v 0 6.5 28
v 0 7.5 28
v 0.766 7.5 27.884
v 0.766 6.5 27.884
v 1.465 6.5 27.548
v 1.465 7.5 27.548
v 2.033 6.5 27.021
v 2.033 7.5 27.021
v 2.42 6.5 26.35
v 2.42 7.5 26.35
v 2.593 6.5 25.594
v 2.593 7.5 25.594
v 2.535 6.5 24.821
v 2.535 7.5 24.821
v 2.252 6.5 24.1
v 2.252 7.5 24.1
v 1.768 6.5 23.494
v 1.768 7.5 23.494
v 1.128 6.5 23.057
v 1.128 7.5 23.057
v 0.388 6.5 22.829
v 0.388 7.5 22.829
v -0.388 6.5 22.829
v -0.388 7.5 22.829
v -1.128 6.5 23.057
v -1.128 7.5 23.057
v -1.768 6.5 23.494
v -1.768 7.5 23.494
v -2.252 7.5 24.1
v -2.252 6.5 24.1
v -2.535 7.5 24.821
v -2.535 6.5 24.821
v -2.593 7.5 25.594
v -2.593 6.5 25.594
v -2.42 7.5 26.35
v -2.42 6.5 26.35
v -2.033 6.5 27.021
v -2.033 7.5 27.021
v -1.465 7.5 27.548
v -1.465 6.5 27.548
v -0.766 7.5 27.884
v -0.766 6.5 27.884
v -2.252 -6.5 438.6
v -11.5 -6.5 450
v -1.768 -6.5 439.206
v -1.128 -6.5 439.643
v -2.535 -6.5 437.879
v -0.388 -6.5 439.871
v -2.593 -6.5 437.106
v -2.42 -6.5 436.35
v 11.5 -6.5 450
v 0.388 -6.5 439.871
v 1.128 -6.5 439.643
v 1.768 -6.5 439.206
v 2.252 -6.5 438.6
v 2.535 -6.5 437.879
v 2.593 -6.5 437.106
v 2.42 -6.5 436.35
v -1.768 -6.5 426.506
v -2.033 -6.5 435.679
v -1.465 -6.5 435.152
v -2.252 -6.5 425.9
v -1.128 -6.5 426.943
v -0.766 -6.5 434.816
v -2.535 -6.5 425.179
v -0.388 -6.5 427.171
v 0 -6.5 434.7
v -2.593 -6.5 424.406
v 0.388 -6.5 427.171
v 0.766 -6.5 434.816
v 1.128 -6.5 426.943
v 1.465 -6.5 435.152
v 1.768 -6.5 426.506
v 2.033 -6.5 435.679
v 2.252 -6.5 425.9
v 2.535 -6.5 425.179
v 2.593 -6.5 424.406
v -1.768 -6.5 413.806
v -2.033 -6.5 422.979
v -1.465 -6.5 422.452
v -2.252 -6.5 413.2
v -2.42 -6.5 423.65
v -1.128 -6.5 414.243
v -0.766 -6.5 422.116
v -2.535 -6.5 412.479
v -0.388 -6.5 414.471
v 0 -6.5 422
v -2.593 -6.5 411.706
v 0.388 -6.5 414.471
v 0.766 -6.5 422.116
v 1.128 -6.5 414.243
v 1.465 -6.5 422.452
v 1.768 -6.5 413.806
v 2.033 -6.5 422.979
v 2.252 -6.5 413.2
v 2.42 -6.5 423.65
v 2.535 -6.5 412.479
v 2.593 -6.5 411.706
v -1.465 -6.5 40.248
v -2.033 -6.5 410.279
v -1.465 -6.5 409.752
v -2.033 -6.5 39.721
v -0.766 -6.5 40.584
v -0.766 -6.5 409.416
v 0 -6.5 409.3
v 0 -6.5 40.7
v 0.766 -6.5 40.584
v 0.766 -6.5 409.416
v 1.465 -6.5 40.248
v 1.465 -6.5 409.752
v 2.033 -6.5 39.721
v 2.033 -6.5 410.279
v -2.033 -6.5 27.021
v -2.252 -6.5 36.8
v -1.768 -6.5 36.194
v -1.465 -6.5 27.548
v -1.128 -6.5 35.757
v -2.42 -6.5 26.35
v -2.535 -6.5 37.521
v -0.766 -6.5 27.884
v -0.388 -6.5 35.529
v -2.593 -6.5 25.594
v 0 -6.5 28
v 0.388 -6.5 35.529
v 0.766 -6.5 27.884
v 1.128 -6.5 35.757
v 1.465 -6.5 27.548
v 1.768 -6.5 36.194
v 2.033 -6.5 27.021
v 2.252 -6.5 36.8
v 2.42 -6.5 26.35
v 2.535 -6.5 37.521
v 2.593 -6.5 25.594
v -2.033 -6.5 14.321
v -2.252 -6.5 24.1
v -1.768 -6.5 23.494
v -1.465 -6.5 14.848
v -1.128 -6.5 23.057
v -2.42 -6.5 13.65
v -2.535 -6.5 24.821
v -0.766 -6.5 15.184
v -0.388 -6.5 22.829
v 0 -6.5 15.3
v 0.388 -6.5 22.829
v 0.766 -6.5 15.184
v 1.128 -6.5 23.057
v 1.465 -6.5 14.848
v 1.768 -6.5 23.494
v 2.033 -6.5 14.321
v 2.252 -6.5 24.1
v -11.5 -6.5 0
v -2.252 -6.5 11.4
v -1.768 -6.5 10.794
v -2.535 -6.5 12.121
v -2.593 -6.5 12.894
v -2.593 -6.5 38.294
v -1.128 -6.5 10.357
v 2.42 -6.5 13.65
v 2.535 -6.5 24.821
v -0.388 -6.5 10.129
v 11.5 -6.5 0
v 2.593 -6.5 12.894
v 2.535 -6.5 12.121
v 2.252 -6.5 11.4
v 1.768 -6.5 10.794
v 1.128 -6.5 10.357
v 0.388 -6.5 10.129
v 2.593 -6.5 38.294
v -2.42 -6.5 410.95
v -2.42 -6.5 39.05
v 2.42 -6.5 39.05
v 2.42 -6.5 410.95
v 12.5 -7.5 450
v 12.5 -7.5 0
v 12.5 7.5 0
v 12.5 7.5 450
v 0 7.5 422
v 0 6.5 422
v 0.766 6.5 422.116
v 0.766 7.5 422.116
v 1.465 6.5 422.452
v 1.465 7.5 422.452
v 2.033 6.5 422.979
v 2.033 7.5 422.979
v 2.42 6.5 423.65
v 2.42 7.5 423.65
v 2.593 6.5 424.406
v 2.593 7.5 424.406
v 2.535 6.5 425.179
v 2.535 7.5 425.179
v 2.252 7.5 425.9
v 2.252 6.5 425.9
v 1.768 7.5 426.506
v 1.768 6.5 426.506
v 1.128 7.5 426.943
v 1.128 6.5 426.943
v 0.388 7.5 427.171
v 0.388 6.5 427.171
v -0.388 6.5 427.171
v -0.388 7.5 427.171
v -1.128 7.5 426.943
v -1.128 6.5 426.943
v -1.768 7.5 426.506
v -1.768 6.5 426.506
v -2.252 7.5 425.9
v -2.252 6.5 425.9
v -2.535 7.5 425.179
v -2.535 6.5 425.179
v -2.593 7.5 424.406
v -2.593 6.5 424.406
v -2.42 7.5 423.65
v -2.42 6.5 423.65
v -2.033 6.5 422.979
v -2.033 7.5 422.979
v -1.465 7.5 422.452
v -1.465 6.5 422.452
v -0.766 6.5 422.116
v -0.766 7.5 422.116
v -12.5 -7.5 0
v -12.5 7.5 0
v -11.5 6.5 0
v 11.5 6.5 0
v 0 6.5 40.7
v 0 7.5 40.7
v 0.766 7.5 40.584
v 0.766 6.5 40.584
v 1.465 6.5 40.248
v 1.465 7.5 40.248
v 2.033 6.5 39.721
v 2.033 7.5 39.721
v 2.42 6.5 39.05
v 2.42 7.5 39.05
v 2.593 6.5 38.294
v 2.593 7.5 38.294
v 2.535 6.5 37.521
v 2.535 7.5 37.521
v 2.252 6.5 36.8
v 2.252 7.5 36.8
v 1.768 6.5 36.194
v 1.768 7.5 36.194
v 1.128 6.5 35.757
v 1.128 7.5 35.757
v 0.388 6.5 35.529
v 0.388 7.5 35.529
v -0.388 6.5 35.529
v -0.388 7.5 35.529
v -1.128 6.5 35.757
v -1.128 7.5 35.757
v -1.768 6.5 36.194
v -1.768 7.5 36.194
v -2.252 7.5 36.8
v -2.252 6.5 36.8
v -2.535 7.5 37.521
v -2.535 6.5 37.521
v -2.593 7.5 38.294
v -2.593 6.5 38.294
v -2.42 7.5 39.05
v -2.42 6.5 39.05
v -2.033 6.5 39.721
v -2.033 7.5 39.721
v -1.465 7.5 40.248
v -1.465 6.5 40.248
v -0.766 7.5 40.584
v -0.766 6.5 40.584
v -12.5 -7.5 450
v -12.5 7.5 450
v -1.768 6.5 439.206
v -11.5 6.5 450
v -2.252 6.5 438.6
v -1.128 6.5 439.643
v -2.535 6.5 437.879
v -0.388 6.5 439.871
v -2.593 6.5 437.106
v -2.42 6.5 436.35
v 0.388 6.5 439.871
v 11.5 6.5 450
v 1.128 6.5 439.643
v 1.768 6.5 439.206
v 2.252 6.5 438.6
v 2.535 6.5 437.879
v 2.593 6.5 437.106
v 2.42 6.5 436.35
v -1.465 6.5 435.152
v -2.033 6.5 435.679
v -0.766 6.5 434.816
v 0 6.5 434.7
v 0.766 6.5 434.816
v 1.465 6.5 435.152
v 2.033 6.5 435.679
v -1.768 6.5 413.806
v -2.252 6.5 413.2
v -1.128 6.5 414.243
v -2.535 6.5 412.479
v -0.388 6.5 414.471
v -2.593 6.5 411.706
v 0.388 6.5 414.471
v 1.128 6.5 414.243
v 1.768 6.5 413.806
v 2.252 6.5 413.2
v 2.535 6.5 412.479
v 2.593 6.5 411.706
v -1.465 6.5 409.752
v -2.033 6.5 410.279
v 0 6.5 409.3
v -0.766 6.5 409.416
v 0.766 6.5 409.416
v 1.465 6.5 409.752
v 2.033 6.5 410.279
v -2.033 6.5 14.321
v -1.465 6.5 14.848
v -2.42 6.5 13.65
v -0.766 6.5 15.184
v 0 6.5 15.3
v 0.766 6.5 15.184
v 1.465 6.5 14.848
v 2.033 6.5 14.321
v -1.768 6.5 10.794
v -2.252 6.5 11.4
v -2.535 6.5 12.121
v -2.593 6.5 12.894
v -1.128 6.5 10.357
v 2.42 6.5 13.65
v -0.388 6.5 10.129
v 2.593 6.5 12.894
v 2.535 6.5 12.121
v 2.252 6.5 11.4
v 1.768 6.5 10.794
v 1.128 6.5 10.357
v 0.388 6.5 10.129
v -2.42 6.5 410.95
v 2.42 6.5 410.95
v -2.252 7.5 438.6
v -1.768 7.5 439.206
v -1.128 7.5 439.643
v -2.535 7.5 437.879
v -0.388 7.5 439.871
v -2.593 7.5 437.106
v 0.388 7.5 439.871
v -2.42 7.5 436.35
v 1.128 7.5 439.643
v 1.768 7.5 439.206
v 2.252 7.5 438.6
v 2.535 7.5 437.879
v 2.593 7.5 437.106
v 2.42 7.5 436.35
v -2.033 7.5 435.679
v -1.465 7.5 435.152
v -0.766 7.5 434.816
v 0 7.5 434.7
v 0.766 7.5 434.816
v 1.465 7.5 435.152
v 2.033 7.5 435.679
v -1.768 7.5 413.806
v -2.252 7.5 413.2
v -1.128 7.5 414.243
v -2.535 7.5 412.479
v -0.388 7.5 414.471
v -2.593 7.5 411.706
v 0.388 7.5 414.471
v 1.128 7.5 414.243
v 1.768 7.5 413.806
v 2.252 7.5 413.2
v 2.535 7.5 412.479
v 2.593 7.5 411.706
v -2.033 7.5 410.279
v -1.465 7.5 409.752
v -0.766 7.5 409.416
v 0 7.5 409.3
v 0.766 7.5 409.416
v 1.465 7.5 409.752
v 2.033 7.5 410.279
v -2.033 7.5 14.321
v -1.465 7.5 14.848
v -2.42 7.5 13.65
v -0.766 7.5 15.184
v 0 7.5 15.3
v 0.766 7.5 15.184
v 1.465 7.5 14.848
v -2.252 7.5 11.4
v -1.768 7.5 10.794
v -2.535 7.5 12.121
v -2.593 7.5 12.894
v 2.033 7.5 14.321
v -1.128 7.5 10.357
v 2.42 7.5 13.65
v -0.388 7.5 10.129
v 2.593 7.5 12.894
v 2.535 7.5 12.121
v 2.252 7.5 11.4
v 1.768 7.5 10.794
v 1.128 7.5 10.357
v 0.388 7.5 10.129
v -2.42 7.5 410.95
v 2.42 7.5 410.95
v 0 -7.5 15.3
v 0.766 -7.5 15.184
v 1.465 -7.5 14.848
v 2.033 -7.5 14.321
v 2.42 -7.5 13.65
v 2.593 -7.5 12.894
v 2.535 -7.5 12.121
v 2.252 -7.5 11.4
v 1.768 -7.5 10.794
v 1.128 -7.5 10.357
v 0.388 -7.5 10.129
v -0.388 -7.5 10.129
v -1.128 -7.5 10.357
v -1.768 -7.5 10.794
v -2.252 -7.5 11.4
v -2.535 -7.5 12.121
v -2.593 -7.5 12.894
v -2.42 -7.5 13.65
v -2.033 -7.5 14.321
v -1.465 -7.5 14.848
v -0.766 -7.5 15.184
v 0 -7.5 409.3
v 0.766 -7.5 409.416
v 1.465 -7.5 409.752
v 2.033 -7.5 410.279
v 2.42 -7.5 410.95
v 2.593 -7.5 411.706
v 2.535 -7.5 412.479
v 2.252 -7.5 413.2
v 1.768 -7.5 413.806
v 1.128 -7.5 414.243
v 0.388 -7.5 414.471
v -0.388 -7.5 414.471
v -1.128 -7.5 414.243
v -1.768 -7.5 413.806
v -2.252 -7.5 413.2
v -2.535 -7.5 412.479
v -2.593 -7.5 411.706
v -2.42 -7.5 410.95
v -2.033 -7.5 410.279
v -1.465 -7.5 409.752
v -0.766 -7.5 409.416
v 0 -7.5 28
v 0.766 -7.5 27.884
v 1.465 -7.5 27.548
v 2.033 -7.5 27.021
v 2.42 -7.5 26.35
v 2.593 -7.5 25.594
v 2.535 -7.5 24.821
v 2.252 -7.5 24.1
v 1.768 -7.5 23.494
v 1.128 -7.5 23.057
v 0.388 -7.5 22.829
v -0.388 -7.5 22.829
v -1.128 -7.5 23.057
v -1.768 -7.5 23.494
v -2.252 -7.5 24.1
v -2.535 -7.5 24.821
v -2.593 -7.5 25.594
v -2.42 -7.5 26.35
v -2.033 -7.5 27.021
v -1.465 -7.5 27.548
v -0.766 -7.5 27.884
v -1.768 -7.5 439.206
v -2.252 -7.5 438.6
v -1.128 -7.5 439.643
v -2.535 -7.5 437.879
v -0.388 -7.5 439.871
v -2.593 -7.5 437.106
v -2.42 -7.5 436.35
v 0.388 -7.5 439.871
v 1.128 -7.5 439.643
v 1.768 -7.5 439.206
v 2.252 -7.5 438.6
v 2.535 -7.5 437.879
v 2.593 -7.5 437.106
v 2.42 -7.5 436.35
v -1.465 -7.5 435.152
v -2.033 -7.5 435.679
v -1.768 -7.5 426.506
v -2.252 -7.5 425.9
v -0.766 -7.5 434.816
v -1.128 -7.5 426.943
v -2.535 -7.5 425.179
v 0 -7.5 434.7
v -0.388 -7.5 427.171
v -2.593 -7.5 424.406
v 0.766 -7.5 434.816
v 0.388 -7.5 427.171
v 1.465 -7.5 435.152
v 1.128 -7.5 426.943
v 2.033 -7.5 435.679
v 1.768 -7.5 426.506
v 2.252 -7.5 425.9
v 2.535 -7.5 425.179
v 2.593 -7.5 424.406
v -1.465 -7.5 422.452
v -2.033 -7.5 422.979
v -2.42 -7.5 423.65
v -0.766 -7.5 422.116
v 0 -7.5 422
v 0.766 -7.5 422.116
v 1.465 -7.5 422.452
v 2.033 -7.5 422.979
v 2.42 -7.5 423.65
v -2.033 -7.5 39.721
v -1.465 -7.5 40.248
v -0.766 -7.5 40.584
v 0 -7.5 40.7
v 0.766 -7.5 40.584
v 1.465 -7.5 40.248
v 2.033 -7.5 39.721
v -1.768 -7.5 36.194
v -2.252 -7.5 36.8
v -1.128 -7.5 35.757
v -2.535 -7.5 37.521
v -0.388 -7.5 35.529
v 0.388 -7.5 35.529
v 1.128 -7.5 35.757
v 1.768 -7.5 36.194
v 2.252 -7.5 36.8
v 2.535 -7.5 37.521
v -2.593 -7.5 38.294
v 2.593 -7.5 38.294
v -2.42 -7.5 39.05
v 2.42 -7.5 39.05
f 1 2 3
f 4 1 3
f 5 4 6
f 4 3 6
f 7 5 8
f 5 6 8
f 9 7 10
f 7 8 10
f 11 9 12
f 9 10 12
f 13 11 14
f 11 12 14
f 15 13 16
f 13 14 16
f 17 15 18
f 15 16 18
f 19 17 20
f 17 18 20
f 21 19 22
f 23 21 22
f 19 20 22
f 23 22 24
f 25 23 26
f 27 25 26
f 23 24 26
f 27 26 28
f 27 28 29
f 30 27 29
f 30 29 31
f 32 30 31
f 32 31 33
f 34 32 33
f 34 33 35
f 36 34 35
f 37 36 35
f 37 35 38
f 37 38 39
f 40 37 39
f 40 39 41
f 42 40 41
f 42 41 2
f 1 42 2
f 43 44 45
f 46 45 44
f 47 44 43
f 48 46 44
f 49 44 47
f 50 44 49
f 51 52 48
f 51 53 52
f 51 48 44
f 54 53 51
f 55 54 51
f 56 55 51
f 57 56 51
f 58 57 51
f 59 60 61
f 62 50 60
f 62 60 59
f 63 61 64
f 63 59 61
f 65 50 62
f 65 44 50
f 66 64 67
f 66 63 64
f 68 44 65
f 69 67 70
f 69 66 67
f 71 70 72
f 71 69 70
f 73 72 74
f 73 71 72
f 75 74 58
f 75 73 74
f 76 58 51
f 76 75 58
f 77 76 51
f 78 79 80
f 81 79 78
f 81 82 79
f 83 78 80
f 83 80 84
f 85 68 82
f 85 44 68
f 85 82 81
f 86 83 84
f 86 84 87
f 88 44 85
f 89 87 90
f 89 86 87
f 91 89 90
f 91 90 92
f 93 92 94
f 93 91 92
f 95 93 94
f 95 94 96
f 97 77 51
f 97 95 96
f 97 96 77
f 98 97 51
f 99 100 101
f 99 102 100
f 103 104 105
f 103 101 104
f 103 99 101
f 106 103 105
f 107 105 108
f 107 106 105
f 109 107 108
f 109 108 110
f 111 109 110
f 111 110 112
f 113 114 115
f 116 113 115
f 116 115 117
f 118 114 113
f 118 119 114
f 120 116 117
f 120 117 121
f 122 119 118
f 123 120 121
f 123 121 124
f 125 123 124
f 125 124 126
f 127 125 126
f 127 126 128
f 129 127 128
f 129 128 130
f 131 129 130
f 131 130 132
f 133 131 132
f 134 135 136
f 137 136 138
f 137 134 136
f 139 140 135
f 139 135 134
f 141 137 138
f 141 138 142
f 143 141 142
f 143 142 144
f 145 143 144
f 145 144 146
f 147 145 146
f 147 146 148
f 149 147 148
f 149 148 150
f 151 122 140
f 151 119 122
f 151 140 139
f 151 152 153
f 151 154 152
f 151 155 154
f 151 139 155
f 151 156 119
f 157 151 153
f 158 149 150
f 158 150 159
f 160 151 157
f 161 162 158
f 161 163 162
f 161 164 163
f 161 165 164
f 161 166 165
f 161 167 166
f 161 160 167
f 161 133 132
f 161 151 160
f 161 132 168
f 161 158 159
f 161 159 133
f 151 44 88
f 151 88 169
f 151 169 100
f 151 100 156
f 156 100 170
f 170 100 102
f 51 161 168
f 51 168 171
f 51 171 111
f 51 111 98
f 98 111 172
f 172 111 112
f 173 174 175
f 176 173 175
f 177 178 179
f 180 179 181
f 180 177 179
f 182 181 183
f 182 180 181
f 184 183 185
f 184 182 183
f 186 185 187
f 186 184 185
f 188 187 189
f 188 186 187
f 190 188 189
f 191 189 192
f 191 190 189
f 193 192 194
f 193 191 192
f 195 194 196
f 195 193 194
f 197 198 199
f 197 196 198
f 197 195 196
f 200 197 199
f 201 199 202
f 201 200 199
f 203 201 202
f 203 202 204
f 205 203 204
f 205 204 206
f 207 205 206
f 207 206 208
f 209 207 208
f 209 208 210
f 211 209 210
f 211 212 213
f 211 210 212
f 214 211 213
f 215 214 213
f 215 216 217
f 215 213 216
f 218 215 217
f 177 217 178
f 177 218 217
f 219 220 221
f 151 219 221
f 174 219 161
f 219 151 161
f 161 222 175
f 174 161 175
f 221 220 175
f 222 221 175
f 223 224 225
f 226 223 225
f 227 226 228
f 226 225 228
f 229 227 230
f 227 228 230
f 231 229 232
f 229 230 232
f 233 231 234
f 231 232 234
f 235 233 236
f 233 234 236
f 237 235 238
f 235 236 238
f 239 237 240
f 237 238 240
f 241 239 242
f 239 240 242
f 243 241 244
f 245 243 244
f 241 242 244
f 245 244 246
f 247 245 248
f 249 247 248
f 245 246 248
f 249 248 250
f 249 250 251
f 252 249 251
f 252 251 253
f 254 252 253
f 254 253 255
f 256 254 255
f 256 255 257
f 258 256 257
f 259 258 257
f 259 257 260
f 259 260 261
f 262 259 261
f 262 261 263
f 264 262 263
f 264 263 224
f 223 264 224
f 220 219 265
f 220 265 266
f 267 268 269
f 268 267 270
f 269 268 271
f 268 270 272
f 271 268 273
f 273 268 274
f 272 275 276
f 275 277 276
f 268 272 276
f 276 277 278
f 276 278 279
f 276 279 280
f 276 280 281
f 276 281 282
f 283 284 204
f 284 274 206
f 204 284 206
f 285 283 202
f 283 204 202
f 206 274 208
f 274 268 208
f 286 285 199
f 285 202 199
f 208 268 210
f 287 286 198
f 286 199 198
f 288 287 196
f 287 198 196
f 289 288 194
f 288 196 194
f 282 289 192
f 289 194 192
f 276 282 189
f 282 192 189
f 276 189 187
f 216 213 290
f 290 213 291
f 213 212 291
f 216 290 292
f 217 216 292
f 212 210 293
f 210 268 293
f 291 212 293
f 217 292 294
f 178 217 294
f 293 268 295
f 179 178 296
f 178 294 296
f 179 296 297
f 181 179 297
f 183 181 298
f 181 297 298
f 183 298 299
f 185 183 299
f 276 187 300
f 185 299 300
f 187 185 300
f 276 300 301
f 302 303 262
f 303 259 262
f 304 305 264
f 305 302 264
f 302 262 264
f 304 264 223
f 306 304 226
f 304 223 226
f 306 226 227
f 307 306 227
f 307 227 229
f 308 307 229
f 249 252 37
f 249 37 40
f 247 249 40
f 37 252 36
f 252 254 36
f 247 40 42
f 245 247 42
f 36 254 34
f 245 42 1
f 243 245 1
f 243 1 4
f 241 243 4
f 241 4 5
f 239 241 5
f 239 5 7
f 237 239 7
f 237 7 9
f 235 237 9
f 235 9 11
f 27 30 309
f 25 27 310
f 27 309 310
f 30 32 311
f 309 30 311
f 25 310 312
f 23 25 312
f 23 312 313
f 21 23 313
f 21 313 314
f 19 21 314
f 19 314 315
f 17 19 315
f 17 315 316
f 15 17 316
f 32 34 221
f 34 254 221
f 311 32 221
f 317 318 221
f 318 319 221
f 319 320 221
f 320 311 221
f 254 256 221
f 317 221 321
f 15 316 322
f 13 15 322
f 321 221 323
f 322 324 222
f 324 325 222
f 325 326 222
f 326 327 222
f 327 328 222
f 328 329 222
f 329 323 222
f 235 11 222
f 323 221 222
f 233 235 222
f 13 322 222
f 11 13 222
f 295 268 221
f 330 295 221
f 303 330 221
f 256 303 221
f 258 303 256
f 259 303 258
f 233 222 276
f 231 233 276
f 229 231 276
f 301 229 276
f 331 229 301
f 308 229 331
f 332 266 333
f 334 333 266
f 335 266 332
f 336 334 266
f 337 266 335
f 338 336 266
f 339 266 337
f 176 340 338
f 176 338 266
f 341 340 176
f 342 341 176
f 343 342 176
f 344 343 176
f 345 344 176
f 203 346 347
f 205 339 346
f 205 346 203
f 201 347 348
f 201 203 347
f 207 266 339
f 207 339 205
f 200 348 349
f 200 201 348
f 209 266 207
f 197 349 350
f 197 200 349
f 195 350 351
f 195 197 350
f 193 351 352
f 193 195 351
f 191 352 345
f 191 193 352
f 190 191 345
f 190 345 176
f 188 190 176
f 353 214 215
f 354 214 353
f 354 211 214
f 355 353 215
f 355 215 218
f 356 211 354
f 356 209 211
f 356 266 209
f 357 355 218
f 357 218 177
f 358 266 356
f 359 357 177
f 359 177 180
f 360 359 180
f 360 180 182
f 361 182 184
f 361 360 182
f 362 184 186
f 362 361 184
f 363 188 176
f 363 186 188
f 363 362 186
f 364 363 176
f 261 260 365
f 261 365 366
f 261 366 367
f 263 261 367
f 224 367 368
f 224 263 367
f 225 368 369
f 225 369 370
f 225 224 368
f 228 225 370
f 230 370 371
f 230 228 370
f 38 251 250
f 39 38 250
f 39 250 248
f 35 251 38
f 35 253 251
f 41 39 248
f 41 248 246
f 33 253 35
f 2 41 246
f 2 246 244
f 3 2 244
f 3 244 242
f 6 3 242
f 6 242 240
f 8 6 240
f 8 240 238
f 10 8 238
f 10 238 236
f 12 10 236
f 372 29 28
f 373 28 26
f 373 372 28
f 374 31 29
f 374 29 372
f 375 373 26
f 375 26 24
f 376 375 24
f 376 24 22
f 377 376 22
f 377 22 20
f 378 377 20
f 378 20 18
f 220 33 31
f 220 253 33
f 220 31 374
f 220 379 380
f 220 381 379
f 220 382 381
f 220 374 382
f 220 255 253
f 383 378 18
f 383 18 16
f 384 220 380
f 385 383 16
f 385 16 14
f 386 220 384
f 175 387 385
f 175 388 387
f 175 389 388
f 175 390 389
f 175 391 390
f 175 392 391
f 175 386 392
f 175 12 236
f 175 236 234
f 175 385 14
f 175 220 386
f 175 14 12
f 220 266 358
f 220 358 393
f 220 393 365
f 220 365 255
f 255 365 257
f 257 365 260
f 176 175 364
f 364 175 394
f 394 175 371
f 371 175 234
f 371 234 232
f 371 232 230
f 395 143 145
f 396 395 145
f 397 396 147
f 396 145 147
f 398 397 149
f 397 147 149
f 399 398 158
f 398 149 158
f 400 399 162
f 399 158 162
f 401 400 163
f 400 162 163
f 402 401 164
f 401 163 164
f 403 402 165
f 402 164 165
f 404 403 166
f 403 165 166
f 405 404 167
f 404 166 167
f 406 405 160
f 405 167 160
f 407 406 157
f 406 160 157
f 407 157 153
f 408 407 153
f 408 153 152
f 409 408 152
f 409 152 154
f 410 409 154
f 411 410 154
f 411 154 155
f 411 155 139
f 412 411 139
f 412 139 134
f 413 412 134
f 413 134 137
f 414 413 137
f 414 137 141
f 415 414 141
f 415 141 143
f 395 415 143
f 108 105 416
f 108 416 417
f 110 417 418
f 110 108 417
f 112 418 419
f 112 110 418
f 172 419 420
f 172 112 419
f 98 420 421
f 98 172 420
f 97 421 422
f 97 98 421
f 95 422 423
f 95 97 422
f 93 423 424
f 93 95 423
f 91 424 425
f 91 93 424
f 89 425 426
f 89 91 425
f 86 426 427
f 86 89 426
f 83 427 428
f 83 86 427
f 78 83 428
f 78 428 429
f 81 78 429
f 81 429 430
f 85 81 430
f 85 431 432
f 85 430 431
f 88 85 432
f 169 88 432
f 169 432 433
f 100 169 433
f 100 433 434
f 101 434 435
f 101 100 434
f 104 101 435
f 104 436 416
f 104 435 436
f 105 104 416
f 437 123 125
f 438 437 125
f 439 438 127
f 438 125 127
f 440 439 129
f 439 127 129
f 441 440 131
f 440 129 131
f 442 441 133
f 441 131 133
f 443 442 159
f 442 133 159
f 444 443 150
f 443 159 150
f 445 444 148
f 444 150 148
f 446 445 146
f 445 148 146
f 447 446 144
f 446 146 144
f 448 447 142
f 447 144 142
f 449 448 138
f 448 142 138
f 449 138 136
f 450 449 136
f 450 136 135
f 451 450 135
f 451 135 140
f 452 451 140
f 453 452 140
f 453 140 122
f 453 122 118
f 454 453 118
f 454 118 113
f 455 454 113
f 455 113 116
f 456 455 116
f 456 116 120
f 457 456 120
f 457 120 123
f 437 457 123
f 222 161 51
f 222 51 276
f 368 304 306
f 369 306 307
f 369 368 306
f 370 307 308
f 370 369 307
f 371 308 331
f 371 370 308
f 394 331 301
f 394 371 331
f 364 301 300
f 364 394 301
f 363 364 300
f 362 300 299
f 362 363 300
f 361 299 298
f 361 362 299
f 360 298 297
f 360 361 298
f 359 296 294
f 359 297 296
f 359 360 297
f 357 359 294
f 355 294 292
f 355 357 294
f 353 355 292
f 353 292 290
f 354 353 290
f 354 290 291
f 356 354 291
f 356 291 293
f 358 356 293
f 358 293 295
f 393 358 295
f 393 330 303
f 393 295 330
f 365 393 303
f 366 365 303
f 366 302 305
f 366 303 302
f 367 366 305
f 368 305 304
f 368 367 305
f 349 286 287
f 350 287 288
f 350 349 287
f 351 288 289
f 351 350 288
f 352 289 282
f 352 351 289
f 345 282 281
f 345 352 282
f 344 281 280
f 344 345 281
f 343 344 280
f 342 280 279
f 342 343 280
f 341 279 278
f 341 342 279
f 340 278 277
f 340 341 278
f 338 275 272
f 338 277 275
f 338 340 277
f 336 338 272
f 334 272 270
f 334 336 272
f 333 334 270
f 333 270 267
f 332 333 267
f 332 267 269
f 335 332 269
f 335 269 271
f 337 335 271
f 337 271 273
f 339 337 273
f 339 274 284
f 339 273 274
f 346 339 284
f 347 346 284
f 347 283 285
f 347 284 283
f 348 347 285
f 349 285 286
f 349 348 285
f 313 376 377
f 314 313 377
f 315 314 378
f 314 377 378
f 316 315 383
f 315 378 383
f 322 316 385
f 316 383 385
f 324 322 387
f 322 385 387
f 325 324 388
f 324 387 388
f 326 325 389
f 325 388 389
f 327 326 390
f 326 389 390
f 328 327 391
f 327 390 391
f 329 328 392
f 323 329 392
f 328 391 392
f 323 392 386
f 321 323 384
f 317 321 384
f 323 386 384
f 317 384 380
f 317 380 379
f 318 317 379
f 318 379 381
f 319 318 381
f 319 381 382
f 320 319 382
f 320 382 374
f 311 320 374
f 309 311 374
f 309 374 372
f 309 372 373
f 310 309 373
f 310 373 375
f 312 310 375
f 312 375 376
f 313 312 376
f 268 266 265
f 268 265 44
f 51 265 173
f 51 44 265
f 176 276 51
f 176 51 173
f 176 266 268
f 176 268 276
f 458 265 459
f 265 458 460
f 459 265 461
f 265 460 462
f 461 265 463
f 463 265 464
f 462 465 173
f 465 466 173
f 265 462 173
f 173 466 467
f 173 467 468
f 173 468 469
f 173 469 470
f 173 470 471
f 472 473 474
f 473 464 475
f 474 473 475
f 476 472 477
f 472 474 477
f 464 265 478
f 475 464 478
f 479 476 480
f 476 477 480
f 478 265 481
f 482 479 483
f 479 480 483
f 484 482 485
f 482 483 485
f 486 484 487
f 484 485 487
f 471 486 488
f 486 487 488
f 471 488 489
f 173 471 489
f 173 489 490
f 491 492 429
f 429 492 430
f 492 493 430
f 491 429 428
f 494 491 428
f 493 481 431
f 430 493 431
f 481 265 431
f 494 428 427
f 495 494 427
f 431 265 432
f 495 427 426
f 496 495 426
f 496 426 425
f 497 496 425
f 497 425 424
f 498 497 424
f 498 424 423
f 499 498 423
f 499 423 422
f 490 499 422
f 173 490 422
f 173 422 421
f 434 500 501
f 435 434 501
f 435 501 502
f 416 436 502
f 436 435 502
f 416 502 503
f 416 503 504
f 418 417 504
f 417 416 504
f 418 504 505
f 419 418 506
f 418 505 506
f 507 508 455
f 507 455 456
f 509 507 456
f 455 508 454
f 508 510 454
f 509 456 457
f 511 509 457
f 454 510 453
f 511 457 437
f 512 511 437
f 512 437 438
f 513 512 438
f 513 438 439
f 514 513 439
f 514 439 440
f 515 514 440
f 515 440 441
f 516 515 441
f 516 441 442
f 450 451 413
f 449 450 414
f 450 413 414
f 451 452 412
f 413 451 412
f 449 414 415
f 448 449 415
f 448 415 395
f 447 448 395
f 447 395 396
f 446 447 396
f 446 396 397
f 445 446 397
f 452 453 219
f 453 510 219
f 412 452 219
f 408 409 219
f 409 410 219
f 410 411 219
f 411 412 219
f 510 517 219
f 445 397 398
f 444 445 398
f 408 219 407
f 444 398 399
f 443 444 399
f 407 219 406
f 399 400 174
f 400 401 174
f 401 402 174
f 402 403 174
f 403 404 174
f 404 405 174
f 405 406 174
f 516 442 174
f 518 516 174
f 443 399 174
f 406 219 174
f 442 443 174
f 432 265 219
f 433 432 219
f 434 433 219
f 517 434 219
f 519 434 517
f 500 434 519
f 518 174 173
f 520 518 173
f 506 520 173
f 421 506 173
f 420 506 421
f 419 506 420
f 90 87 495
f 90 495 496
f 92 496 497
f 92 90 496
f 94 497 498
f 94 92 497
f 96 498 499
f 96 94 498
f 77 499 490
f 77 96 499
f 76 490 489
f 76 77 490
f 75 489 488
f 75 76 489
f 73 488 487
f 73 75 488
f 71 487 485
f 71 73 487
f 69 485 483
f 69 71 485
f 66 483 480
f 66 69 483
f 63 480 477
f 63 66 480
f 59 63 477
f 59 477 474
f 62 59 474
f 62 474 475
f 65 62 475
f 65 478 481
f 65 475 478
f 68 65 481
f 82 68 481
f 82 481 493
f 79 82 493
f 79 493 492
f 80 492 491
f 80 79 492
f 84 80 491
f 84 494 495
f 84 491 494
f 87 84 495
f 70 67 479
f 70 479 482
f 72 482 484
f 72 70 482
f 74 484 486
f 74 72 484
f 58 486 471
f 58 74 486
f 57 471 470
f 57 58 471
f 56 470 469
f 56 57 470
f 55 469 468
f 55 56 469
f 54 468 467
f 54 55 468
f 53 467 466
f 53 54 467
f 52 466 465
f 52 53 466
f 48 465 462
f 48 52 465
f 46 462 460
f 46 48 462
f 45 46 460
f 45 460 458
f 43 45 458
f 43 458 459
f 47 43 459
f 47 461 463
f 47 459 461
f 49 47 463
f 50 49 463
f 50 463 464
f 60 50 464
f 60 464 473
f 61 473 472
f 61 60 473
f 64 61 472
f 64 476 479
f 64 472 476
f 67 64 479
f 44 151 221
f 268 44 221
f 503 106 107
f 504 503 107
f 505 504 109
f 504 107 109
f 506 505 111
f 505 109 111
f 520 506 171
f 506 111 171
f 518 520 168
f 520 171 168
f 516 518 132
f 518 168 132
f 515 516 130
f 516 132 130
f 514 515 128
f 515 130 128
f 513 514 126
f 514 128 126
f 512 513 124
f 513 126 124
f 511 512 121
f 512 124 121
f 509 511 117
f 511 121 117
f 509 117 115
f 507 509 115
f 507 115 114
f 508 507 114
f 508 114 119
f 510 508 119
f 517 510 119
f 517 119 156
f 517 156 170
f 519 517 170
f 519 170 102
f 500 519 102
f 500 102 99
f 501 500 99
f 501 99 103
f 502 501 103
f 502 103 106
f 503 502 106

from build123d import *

# Parameters (mm, degrees)
SKETCH_1_W          = 25
SKETCH_1_H          = 15
SKETCH_1_W_2        = 23
SKETCH_1_H_2        = 13
EXTRUDE_1_DEPTH     = 450
SKETCH_2_R          = 2.6
CUT_EXTRUDE_1_DEPTH = 451.423411914


with BuildPart() as part:
    # ｽｹｯﾁ1 → ﾎﾞｽ - 押し出し1 (new body)
    with BuildSketch(Plane.XY):
        Rectangle(SKETCH_1_W, SKETCH_1_H)
        Rectangle(SKETCH_1_W_2, SKETCH_1_H_2, mode=Mode.SUBTRACT)
    extrude(amount=EXTRUDE_1_DEPTH)

    # ｽｹｯﾁ2 → ｶｯﾄ - 押し出し1 (cut, through all)
    with BuildSketch(Plane(origin=(0, 7.5, 0), x_dir=(1, 0, 0), z_dir=(0, 1, 0))):
        with Locations(Location((0, -12.7, 0), (0, 0, 270))):
            Circle(SKETCH_2_R)
        with Locations(Location((0, -25.4, 0), (0, 0, 270))):
            Circle(SKETCH_2_R)
        with Locations(Location((0, -38.1, 0), (0, 0, 270))):
            Circle(SKETCH_2_R)
    cut_extrude_1 = extrude(amount=-CUT_EXTRUDE_1_DEPTH, mode=Mode.SUBTRACT)

    # ﾐﾗｰ1: ｶｯﾄ - 押し出し1 across plane
    add(cut_extrude_1.mirror(Plane(origin=(0, 0, 225), x_dir=(1, 0, 0), z_dir=(0, 0, -1))), mode=Mode.SUBTRACT)


solid = part.part
